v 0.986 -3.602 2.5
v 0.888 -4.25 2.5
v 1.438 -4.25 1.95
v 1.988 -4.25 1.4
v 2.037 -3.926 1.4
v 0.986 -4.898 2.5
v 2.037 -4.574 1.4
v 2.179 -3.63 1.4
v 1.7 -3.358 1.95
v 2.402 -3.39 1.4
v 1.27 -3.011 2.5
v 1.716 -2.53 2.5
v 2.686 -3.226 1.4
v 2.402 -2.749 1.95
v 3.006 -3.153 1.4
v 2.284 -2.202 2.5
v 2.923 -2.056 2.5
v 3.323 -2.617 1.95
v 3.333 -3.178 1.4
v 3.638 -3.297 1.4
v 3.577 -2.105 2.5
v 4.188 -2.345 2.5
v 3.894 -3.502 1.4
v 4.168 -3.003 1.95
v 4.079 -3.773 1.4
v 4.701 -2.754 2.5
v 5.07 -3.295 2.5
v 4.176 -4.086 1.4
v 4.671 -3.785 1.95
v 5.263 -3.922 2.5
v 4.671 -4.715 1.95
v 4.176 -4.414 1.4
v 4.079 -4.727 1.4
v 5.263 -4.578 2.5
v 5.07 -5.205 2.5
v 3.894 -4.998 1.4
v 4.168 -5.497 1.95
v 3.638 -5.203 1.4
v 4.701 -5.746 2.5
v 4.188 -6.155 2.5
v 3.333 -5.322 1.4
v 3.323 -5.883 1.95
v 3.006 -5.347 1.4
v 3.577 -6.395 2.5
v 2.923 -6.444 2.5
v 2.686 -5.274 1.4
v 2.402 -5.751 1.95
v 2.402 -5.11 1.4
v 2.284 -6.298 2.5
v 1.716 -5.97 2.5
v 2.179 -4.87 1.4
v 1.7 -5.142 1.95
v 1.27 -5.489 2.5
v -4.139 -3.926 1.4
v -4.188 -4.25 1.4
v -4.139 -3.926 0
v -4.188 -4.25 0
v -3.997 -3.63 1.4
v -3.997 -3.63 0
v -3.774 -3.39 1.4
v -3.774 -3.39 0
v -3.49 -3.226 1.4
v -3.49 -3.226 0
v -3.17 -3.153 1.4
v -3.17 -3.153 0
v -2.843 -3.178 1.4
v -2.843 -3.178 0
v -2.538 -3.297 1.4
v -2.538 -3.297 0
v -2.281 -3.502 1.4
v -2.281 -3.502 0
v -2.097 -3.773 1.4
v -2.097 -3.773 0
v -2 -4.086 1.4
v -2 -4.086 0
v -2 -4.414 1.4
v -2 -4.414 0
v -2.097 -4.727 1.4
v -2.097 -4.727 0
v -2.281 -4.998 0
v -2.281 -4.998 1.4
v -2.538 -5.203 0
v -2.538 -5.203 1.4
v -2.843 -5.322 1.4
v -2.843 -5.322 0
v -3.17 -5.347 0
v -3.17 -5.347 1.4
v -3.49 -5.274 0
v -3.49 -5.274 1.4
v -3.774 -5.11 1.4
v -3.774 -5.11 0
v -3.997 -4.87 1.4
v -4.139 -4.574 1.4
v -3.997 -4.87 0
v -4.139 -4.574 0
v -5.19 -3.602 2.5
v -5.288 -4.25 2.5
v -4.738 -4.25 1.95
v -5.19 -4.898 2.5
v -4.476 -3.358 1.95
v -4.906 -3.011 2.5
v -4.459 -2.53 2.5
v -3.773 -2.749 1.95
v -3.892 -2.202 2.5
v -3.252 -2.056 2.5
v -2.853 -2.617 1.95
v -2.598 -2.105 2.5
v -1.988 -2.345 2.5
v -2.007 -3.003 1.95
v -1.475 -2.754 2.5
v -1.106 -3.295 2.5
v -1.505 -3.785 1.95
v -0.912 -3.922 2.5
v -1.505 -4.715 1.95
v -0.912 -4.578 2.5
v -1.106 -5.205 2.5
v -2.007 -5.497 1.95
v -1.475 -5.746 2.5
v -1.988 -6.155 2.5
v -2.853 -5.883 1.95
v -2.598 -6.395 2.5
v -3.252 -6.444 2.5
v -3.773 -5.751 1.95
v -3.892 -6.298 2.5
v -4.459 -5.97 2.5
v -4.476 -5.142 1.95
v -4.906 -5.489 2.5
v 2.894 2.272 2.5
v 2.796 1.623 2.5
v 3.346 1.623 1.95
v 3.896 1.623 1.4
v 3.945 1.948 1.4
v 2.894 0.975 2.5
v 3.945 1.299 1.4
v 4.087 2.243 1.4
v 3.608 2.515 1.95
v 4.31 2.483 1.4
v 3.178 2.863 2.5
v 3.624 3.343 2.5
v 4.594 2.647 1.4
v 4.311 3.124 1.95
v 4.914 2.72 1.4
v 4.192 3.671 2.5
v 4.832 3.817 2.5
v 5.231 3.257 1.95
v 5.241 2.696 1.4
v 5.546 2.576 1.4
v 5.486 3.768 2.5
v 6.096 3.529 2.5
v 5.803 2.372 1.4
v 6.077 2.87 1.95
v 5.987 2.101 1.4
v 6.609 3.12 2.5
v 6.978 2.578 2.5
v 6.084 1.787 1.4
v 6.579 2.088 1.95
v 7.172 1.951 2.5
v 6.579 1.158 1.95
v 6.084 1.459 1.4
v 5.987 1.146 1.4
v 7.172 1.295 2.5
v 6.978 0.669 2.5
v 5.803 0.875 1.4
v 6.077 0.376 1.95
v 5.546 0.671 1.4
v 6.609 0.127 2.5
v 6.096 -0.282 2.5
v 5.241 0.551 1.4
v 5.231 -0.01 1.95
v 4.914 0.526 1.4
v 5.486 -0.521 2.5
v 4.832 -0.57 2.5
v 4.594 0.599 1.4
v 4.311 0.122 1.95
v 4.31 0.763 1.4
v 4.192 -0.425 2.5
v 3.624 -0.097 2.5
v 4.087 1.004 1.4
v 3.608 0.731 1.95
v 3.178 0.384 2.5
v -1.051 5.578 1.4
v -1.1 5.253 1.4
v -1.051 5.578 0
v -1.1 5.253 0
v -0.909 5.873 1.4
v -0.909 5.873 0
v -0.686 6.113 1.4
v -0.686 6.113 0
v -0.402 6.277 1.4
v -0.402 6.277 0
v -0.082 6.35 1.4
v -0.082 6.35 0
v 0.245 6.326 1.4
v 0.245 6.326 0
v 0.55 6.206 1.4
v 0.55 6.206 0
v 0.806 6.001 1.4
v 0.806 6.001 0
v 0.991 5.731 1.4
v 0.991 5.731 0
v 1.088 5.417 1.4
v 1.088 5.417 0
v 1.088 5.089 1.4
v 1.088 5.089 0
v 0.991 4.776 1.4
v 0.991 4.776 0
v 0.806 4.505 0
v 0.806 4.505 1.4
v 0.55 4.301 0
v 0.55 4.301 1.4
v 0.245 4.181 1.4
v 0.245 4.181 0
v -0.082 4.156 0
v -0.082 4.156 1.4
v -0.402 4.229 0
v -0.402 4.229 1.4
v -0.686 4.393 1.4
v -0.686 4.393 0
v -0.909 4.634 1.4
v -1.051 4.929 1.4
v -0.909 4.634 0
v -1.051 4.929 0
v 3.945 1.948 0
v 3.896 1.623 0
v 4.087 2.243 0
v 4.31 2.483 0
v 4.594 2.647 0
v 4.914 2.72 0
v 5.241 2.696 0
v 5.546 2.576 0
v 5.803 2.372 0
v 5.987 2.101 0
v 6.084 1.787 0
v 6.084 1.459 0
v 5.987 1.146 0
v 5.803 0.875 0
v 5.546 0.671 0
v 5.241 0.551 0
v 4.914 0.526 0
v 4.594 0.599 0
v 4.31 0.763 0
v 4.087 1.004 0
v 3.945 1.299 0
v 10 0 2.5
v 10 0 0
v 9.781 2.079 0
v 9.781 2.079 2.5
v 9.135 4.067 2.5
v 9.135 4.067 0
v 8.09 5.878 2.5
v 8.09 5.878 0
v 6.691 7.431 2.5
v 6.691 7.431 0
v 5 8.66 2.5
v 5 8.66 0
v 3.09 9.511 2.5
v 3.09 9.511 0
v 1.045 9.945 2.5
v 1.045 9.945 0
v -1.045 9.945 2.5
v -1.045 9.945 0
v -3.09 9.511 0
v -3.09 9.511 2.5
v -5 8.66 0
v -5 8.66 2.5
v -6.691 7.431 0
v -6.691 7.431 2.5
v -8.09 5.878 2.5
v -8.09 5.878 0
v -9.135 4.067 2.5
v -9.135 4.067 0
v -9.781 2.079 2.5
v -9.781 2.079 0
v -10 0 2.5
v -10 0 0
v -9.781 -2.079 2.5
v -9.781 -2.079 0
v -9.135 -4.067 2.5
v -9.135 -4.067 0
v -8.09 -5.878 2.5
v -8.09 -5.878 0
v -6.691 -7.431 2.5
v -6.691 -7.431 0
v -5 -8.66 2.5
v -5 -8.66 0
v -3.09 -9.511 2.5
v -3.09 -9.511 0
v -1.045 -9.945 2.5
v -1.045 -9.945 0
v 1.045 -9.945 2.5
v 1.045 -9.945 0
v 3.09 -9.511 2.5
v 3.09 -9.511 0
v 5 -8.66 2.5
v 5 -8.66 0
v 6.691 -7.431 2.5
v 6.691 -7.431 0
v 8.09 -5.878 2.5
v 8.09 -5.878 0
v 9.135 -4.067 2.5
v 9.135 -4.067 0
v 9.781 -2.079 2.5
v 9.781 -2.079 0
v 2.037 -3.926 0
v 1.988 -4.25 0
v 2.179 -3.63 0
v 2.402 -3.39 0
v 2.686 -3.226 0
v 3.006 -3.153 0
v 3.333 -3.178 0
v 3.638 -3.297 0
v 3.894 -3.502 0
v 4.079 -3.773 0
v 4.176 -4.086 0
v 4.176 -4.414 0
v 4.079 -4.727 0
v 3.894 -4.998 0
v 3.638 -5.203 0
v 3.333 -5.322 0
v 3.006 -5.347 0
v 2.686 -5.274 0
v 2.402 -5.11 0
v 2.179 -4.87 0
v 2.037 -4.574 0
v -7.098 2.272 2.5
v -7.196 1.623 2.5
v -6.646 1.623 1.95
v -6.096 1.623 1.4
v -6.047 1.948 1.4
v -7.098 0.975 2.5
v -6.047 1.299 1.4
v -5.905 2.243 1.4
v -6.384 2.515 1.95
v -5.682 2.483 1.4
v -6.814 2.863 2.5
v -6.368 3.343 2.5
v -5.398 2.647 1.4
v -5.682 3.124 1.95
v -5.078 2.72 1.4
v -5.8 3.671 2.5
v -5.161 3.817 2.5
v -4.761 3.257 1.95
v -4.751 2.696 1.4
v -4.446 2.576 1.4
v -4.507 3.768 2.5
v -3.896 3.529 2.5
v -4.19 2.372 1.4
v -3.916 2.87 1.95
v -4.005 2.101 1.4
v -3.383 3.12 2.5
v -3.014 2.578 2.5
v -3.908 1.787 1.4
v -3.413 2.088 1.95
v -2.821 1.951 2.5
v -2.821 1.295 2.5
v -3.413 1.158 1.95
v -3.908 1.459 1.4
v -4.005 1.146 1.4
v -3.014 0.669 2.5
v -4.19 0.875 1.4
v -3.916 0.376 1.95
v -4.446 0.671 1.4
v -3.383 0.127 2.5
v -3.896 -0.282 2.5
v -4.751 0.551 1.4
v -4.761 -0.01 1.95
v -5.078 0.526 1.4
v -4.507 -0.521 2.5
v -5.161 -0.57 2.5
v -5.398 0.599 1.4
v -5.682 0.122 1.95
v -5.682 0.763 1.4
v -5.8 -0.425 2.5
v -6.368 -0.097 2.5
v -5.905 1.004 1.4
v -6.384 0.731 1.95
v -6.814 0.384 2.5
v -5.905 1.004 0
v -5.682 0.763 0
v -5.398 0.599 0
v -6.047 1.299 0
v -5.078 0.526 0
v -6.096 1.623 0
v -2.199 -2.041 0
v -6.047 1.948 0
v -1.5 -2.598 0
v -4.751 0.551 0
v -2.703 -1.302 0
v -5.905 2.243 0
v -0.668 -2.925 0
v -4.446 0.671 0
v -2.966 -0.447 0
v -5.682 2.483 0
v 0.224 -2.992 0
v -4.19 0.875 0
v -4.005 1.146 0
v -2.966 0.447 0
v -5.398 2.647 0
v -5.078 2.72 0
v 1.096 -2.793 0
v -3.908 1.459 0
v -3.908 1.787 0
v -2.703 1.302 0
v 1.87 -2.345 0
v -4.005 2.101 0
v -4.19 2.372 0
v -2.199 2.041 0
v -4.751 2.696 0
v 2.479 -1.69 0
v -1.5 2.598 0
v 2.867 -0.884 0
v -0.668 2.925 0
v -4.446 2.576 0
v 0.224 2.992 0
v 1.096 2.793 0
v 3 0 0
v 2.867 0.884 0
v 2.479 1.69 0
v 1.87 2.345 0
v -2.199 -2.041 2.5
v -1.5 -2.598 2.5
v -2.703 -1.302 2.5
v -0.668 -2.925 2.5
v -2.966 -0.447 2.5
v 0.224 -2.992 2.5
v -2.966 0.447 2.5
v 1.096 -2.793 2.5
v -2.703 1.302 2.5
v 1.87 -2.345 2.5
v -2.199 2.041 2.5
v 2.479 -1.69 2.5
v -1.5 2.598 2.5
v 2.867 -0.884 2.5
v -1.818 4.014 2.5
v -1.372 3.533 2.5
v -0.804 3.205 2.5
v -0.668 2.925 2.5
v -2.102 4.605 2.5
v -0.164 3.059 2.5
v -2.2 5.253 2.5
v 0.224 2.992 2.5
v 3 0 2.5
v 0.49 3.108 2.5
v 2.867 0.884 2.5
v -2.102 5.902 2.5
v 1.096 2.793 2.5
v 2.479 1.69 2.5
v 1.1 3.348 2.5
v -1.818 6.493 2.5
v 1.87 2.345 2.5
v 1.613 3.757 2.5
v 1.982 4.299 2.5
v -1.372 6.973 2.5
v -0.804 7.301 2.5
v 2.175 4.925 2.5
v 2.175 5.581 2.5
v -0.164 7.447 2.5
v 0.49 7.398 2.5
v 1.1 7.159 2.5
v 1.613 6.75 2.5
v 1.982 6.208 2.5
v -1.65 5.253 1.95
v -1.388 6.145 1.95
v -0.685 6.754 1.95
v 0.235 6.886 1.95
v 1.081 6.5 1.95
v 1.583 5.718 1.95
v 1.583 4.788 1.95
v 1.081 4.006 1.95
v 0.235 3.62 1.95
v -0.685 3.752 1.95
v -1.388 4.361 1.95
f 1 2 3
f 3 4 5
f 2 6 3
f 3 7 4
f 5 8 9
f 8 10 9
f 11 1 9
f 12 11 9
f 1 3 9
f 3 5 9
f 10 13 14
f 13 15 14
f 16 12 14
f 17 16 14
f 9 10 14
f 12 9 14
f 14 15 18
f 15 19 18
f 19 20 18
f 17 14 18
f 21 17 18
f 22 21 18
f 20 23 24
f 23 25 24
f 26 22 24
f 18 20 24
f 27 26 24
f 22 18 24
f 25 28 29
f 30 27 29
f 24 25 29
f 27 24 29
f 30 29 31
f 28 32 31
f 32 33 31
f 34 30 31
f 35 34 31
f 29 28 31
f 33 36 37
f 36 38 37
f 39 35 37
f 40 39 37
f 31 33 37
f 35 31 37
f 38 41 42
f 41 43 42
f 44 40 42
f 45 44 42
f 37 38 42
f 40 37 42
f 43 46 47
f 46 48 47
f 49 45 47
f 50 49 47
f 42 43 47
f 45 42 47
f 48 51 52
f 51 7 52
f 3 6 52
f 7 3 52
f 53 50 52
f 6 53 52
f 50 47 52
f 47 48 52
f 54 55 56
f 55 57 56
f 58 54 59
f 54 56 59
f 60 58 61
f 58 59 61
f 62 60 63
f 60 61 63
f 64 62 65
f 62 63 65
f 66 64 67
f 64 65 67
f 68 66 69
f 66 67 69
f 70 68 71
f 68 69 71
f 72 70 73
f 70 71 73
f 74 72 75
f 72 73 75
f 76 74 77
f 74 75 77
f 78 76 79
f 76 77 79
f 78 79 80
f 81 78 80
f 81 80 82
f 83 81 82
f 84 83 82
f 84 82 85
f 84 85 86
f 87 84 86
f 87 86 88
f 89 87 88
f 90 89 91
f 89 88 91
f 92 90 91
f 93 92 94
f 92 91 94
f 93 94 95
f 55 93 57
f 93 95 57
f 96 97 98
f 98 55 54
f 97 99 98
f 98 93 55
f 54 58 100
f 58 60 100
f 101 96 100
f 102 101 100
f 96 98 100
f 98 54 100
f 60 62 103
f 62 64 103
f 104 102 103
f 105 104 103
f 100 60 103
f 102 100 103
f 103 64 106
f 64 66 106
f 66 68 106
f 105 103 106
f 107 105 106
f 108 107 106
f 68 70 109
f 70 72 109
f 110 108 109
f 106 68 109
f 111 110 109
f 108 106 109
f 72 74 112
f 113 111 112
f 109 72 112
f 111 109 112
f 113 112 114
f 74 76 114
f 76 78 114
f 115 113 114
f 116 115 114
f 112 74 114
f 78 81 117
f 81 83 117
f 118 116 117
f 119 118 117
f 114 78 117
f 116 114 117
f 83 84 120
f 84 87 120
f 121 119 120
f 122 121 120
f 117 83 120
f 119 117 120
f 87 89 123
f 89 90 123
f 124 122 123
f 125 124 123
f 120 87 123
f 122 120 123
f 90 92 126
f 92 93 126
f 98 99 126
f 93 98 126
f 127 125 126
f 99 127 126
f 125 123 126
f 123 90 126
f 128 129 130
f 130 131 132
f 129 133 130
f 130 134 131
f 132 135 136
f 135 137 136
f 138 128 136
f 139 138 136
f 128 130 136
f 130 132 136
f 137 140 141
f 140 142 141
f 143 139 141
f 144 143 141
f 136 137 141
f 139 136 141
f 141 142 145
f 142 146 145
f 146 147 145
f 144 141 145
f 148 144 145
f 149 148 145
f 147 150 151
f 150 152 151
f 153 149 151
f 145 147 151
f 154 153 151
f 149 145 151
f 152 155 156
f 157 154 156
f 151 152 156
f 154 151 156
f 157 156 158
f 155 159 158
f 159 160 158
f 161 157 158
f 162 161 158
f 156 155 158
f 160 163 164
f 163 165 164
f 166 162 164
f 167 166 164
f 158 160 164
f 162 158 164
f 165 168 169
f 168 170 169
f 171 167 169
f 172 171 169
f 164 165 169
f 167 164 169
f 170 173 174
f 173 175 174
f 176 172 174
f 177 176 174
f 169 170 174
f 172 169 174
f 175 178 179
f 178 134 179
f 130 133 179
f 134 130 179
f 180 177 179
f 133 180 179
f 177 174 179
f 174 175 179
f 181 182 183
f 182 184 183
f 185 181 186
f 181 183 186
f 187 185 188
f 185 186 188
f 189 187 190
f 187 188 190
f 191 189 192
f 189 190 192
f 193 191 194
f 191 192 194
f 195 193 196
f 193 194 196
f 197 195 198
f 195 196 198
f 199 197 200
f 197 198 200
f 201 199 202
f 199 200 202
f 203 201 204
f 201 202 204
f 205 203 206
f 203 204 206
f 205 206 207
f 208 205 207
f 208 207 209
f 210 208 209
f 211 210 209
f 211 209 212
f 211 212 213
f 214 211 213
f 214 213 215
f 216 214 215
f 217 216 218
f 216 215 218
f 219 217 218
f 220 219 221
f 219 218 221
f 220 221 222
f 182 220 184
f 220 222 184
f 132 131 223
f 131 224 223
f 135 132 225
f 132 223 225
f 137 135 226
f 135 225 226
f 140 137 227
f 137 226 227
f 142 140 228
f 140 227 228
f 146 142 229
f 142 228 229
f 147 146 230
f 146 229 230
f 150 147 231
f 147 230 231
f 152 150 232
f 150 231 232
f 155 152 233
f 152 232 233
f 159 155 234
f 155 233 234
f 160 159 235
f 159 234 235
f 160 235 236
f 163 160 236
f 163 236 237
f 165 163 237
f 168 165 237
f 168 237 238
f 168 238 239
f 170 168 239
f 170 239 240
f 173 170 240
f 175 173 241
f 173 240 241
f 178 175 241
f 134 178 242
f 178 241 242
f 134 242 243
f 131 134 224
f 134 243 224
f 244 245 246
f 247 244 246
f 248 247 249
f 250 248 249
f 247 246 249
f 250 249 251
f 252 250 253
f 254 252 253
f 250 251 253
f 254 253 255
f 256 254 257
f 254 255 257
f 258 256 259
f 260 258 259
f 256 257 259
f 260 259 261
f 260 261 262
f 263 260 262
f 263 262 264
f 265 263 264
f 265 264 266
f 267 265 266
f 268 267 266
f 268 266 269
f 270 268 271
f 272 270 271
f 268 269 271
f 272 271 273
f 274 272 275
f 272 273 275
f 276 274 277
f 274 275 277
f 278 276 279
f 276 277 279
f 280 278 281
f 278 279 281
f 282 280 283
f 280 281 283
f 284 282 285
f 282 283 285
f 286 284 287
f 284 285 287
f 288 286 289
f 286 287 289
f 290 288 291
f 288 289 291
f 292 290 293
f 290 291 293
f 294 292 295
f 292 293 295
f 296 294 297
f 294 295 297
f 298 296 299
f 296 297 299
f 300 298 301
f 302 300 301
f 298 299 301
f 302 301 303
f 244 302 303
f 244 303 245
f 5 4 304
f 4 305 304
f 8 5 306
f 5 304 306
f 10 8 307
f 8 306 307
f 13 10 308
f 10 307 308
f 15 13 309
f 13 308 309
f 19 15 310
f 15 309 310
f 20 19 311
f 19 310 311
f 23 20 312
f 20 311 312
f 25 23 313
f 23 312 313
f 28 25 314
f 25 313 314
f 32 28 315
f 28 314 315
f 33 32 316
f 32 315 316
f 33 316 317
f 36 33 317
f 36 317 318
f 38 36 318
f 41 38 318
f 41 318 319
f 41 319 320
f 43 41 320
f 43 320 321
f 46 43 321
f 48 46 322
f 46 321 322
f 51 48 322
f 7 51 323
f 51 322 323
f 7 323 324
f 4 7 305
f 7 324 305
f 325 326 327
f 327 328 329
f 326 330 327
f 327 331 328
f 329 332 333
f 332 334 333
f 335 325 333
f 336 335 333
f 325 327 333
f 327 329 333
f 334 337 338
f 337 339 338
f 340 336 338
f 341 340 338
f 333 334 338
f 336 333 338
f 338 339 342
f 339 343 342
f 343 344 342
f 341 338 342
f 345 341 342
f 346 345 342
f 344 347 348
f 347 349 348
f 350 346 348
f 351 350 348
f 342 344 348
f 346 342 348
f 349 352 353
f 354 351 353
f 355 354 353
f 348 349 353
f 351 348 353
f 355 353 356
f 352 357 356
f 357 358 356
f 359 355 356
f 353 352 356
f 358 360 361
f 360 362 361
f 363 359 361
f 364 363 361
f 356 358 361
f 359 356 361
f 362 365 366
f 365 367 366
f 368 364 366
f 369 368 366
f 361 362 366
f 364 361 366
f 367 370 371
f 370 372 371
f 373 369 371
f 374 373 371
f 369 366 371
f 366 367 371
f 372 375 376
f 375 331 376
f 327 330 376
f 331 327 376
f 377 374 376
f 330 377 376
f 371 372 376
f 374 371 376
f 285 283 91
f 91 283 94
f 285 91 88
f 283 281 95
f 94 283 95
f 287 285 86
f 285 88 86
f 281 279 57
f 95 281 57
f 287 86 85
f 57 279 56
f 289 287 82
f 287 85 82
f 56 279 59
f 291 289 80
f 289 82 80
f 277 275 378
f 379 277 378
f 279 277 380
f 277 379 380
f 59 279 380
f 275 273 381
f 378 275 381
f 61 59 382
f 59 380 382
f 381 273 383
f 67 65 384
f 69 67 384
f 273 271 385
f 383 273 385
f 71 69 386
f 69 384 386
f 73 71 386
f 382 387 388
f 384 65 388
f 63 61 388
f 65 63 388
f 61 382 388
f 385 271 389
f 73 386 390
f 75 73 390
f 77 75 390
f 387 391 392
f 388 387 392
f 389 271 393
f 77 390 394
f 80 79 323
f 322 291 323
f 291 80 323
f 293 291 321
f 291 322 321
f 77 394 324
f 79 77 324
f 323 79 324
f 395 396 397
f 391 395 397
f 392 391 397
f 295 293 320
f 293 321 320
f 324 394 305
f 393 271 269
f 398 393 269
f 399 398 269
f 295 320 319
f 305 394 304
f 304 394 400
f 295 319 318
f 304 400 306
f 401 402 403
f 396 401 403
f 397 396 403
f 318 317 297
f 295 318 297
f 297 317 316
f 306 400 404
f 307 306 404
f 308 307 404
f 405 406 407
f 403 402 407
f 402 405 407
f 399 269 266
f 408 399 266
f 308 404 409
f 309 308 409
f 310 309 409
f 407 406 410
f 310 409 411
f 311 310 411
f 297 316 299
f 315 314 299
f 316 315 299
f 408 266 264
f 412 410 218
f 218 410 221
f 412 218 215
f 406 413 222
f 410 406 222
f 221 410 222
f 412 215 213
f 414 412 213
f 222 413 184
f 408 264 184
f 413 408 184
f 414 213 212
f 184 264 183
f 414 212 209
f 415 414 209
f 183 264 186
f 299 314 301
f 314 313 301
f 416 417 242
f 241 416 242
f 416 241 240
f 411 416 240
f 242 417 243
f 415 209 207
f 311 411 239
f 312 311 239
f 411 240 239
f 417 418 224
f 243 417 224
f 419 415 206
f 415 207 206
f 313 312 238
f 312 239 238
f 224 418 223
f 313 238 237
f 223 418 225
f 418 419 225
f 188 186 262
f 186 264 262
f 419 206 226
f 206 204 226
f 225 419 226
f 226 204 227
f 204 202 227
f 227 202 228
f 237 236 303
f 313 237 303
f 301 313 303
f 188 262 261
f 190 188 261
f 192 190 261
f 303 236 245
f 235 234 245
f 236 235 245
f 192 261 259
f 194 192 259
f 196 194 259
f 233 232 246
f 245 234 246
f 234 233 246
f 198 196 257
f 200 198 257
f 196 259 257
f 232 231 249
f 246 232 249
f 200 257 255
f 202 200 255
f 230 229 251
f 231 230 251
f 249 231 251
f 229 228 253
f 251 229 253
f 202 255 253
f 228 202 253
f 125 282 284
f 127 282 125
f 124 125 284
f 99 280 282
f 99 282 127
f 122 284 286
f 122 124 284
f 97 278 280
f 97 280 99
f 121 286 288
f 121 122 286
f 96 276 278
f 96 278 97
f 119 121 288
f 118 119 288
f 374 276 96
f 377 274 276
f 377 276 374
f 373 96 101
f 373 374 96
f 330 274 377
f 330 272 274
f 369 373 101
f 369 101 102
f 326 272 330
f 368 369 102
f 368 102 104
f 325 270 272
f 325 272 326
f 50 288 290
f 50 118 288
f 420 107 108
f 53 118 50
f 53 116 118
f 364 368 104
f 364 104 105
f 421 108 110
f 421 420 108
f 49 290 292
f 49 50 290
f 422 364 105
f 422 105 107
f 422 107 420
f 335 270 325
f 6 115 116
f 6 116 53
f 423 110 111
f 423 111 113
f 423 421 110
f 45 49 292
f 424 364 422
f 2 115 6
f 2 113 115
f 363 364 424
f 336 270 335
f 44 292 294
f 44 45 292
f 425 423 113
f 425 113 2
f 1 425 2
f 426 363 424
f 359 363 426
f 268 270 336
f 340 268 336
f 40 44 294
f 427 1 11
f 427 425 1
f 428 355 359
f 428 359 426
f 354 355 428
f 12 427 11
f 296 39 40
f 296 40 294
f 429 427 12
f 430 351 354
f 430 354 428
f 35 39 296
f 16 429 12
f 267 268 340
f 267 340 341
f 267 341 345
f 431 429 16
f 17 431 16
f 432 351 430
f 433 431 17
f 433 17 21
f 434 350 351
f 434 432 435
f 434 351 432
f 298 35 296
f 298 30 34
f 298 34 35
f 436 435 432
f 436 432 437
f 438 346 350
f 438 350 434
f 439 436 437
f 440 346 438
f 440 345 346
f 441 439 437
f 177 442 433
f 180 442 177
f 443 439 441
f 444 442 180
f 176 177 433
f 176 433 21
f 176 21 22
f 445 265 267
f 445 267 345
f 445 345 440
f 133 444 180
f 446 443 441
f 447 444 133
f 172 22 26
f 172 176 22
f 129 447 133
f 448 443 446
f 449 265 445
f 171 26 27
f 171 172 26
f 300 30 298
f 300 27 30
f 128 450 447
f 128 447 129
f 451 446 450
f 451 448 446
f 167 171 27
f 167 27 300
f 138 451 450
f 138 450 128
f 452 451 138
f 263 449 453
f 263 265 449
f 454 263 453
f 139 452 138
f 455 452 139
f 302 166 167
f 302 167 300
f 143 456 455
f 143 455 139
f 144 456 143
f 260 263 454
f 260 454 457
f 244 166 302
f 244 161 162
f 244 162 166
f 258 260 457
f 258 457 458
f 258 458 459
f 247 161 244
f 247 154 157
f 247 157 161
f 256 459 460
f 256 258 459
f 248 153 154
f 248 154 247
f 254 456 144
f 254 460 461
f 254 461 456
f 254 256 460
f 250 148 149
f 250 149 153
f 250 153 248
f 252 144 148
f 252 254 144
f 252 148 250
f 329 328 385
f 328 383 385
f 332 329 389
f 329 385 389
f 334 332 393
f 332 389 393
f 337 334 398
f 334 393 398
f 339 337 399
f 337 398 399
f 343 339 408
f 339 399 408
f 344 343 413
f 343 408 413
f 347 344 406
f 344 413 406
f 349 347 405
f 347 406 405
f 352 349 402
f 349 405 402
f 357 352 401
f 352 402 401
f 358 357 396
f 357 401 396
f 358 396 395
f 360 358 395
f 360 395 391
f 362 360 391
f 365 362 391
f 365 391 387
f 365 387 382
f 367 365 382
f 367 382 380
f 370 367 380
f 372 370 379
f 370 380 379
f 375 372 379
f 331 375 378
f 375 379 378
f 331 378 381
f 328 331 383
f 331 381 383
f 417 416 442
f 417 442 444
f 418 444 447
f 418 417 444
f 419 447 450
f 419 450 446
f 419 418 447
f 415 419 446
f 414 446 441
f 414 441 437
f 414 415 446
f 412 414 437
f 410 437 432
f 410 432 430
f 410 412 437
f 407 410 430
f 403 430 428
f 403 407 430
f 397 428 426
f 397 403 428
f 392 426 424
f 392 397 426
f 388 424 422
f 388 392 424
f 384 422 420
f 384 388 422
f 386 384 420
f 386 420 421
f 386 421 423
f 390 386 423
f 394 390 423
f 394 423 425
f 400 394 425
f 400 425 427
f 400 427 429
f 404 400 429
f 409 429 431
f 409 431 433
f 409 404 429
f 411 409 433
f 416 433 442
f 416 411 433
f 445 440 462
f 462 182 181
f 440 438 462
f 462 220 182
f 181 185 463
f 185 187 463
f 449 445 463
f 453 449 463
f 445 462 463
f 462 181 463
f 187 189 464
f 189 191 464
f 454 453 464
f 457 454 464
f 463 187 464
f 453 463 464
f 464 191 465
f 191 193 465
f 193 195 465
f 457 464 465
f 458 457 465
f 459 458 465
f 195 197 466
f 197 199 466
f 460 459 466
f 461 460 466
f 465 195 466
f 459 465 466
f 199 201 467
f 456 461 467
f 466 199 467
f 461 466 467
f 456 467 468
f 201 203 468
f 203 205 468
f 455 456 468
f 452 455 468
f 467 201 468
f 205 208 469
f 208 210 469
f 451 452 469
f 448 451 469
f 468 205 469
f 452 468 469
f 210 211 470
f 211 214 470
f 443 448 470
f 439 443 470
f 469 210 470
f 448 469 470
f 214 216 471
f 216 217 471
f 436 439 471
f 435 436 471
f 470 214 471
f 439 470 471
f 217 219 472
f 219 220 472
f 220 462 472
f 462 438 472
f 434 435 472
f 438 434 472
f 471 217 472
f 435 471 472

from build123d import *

# Parameters (mm, degrees)
SKETCH1_R                                       = 10
SKETCH1_R_2                                     = 3
BOSS_EXTRUDE1_DEPTH                             = 2.5
CSK_FOR_M2_FLAT_HEAD_MACHINE_SCREW3_D           = 2.2
CSK_FOR_M2_FLAT_HEAD_MACHINE_SCREW3_CSINK_D     = 4.4
CSK_FOR_M2_FLAT_HEAD_MACHINE_SCREW3_CSINK_ANGLE = 90


with BuildPart() as part:
    # Sketch1 → Boss-Extrude1 (new body)
    # profile 1 of 2: a face of its own
    with BuildSketch(Plane.XY):
        Circle(SKETCH1_R)
        Polygon((4.996174644, 1.623355548), (0, 5.253288904), (-4.996174644, 1.623355548), (-3.087805744, -4.25), (3.087805744, -4.25), align=None, mode=Mode.SUBTRACT)
    # profile 2 of 2: a face of its own
    with BuildSketch(Plane.XY):
        Polygon((3.087805744, -4.25), (4.996174644, 1.623355548), (0, 5.253288904), (-4.996174644, 1.623355548), (-3.087805744, -4.25), align=None)
        Circle(SKETCH1_R_2, mode=Mode.SUBTRACT)
    extrude(amount=BOSS_EXTRUDE1_DEPTH)

    # CSK for M2 Flat Head Machine Screw3 (through all)
    with Locations(Plane.XY.offset(2.5)):
        with Locations((0, 5.253288904), (4.996174644, 1.623355548), (3.087805744, -4.25), (-4.996174644, 1.623355548), (-3.087805744, -4.25)):
            CounterSinkHole(CSK_FOR_M2_FLAT_HEAD_MACHINE_SCREW3_D / 2, CSK_FOR_M2_FLAT_HEAD_MACHINE_SCREW3_CSINK_D / 2, counter_sink_angle=CSK_FOR_M2_FLAT_HEAD_MACHINE_SCREW3_CSINK_ANGLE)


solid = part.part
